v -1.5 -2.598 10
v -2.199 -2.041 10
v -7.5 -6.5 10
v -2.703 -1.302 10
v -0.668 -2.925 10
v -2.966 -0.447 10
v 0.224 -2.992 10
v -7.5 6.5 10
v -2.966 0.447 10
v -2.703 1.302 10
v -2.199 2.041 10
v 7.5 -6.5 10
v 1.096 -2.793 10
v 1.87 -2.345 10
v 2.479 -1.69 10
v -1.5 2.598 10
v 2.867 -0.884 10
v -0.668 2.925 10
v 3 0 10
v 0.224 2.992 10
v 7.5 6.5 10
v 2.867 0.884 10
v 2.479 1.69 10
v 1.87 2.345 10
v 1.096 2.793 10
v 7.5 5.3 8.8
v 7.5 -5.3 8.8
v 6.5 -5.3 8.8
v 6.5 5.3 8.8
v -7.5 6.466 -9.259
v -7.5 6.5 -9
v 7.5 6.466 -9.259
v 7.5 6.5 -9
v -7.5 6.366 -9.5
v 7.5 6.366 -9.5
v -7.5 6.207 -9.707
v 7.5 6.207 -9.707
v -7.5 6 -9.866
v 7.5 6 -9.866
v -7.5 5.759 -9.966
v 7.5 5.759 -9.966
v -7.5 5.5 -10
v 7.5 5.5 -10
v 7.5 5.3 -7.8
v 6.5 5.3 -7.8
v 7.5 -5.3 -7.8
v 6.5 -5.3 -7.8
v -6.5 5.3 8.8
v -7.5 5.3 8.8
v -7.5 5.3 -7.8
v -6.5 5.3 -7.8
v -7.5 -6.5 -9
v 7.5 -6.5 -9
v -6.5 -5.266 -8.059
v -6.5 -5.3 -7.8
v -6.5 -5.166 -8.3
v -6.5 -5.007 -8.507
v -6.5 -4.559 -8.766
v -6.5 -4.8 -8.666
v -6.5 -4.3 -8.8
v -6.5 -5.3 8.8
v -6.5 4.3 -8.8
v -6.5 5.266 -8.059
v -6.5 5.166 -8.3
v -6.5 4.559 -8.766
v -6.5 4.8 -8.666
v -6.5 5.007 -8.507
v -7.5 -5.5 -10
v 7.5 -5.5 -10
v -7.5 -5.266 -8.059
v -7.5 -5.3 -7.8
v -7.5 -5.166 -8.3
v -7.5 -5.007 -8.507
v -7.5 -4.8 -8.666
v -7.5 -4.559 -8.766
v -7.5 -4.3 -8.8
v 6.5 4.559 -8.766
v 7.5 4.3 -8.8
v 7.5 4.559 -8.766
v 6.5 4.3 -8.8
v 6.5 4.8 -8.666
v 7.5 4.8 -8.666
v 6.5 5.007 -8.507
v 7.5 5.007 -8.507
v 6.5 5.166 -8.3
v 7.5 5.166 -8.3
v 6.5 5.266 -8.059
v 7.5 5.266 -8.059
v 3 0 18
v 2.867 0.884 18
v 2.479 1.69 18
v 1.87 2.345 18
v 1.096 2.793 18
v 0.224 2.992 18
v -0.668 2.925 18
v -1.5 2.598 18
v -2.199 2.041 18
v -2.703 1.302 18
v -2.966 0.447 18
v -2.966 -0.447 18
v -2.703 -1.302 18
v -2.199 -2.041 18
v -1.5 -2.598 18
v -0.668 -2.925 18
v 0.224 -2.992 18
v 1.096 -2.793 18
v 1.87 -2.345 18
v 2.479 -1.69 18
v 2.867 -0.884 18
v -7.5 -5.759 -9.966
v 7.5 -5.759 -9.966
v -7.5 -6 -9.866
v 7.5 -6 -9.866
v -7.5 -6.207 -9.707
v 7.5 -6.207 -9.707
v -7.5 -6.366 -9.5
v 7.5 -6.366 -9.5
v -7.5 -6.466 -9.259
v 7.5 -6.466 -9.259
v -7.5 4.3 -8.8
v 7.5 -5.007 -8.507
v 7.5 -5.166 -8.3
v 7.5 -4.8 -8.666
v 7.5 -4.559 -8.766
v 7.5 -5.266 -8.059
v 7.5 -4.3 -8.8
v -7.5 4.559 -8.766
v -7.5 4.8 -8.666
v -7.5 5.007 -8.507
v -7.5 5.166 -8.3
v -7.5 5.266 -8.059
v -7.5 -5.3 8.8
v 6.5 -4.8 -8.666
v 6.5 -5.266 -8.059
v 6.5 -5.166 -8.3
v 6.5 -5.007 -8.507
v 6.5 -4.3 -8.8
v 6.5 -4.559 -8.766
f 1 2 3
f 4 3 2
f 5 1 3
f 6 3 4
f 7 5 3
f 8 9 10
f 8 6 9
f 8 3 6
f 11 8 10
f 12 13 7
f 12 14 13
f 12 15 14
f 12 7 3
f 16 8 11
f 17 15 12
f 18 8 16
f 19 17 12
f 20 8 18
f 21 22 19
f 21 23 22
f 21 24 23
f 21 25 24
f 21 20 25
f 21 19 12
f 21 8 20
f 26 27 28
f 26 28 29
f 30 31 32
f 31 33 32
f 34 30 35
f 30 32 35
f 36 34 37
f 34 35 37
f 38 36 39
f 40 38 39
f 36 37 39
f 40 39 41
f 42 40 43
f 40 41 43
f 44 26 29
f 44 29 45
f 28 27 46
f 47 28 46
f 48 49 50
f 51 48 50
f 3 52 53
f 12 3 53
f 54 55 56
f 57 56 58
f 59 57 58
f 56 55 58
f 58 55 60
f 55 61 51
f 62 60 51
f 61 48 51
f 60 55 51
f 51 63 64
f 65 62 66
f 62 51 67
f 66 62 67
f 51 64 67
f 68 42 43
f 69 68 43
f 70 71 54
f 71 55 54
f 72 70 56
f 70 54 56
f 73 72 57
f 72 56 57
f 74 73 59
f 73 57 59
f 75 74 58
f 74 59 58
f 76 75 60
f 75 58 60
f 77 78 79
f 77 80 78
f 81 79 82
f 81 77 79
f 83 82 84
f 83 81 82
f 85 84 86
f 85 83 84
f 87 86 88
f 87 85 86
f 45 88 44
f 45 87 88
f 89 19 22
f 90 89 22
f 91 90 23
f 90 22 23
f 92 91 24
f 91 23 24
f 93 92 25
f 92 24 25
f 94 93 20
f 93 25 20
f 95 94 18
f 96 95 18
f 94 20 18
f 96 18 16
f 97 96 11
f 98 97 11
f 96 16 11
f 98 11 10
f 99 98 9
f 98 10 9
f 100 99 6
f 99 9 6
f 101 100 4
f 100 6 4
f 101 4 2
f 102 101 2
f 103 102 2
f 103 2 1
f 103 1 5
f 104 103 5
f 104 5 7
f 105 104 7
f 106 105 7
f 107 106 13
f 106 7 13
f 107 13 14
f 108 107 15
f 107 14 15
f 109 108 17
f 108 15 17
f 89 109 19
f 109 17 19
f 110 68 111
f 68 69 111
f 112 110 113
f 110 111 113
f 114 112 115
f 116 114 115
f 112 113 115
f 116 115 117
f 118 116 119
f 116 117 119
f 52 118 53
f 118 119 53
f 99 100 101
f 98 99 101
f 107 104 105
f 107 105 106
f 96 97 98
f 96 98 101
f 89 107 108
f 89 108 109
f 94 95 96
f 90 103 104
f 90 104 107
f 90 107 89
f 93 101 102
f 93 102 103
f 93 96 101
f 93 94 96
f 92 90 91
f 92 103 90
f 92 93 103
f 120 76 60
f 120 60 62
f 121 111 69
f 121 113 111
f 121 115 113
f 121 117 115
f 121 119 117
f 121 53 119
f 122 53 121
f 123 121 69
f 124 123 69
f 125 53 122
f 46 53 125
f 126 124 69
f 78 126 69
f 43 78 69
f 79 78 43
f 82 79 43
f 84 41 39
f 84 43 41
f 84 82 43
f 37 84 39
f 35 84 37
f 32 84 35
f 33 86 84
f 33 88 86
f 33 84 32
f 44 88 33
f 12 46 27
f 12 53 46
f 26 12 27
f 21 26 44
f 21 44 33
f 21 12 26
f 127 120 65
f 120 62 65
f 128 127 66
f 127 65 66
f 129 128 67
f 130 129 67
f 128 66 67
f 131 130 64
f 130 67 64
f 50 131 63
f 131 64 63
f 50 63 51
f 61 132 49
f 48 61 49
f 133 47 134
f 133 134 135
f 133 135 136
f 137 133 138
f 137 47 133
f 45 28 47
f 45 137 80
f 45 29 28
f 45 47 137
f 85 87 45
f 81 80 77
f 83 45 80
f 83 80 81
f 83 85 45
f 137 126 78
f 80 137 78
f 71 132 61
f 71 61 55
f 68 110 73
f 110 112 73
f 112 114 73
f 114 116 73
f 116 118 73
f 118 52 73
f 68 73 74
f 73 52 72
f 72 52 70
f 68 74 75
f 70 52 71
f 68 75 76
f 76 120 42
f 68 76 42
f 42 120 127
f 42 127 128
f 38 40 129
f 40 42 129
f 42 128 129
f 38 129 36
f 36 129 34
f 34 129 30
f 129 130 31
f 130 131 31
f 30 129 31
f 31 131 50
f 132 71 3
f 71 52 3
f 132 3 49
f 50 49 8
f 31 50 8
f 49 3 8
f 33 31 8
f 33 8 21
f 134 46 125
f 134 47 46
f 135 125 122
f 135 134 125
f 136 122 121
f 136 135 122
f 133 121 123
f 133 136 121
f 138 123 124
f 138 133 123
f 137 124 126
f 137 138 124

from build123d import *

# Parameters (mm, degrees)
ESQUISSE1_W             = 15
ESQUISSE1_H             = 13
BOSS_EXTRU_1_DEPTH      = 10
CONG_1_R                = 1
ESQUISSE2_W             = 17.6
ESQUISSE2_H             = 10.6
ENL_V_MAT_EXTRU_1_DEPTH = 1
CONG_2_R                = 1
CONG_2_OF_SYM_TRIE1_R   = 1
ESQUISSE3_R             = 3
BOSS_EXTRU_2_DEPTH      = 8


with BuildPart() as part:
    # Esquisse1 → Boss.-Extru.1 (new, symmetric)
    with BuildSketch(Plane.XY):
        Rectangle(ESQUISSE1_W, ESQUISSE1_H)
    extrude(amount=BOSS_EXTRU_1_DEPTH, both=True)

    # Congé1
    cong_1_edges = [part.edges().sort_by_distance(p)[0] for p in [
        (0, 6.5, -10),
        (0, -6.5, -10),
    ]]
    fillet(cong_1_edges, radius=CONG_1_R)

    # Esquisse2 → Enlèv. mat.-Extru.1 (cut)
    with BuildSketch(Plane(origin=(7.5, 0, 0), x_dir=(0, 0, -1), z_dir=(1, 0, 0))):
        Rectangle(ESQUISSE2_W, ESQUISSE2_H)
    enl_v_mat_extru_1 = extrude(amount=-ENL_V_MAT_EXTRU_1_DEPTH, mode=Mode.SUBTRACT)

    # Congé2
    cong_2_edges = [part.edges().sort_by_distance(p)[0] for p in [
        (7, 5.3, -8.8),
        (7, -5.3, -8.8),
    ]]
    fillet(cong_2_edges, radius=CONG_2_R)

    # Symétrie1: Enlèv. mat.-Extru.1 across plane
    add(enl_v_mat_extru_1.mirror(Plane(origin=(0, 0, 0), x_dir=(0, 0, 1), z_dir=(1, 0, 0))), mode=Mode.SUBTRACT)

    # Congé2 of Symétrie1
    cong_2_of_sym_trie1_edges = [part.edges().sort_by_distance(p)[0] for p in [
        (-7, 5.3, -8.8),
        (-7, -5.3, -8.8),
    ]]
    fillet(cong_2_of_sym_trie1_edges, radius=CONG_2_OF_SYM_TRIE1_R)

    # Esquisse3 → Boss.-Extru.2 (add)
    with BuildSketch(Plane.XY.offset(10)):
        Circle(ESQUISSE3_R)
    extrude(amount=BOSS_EXTRU_2_DEPTH)


solid = part.part
